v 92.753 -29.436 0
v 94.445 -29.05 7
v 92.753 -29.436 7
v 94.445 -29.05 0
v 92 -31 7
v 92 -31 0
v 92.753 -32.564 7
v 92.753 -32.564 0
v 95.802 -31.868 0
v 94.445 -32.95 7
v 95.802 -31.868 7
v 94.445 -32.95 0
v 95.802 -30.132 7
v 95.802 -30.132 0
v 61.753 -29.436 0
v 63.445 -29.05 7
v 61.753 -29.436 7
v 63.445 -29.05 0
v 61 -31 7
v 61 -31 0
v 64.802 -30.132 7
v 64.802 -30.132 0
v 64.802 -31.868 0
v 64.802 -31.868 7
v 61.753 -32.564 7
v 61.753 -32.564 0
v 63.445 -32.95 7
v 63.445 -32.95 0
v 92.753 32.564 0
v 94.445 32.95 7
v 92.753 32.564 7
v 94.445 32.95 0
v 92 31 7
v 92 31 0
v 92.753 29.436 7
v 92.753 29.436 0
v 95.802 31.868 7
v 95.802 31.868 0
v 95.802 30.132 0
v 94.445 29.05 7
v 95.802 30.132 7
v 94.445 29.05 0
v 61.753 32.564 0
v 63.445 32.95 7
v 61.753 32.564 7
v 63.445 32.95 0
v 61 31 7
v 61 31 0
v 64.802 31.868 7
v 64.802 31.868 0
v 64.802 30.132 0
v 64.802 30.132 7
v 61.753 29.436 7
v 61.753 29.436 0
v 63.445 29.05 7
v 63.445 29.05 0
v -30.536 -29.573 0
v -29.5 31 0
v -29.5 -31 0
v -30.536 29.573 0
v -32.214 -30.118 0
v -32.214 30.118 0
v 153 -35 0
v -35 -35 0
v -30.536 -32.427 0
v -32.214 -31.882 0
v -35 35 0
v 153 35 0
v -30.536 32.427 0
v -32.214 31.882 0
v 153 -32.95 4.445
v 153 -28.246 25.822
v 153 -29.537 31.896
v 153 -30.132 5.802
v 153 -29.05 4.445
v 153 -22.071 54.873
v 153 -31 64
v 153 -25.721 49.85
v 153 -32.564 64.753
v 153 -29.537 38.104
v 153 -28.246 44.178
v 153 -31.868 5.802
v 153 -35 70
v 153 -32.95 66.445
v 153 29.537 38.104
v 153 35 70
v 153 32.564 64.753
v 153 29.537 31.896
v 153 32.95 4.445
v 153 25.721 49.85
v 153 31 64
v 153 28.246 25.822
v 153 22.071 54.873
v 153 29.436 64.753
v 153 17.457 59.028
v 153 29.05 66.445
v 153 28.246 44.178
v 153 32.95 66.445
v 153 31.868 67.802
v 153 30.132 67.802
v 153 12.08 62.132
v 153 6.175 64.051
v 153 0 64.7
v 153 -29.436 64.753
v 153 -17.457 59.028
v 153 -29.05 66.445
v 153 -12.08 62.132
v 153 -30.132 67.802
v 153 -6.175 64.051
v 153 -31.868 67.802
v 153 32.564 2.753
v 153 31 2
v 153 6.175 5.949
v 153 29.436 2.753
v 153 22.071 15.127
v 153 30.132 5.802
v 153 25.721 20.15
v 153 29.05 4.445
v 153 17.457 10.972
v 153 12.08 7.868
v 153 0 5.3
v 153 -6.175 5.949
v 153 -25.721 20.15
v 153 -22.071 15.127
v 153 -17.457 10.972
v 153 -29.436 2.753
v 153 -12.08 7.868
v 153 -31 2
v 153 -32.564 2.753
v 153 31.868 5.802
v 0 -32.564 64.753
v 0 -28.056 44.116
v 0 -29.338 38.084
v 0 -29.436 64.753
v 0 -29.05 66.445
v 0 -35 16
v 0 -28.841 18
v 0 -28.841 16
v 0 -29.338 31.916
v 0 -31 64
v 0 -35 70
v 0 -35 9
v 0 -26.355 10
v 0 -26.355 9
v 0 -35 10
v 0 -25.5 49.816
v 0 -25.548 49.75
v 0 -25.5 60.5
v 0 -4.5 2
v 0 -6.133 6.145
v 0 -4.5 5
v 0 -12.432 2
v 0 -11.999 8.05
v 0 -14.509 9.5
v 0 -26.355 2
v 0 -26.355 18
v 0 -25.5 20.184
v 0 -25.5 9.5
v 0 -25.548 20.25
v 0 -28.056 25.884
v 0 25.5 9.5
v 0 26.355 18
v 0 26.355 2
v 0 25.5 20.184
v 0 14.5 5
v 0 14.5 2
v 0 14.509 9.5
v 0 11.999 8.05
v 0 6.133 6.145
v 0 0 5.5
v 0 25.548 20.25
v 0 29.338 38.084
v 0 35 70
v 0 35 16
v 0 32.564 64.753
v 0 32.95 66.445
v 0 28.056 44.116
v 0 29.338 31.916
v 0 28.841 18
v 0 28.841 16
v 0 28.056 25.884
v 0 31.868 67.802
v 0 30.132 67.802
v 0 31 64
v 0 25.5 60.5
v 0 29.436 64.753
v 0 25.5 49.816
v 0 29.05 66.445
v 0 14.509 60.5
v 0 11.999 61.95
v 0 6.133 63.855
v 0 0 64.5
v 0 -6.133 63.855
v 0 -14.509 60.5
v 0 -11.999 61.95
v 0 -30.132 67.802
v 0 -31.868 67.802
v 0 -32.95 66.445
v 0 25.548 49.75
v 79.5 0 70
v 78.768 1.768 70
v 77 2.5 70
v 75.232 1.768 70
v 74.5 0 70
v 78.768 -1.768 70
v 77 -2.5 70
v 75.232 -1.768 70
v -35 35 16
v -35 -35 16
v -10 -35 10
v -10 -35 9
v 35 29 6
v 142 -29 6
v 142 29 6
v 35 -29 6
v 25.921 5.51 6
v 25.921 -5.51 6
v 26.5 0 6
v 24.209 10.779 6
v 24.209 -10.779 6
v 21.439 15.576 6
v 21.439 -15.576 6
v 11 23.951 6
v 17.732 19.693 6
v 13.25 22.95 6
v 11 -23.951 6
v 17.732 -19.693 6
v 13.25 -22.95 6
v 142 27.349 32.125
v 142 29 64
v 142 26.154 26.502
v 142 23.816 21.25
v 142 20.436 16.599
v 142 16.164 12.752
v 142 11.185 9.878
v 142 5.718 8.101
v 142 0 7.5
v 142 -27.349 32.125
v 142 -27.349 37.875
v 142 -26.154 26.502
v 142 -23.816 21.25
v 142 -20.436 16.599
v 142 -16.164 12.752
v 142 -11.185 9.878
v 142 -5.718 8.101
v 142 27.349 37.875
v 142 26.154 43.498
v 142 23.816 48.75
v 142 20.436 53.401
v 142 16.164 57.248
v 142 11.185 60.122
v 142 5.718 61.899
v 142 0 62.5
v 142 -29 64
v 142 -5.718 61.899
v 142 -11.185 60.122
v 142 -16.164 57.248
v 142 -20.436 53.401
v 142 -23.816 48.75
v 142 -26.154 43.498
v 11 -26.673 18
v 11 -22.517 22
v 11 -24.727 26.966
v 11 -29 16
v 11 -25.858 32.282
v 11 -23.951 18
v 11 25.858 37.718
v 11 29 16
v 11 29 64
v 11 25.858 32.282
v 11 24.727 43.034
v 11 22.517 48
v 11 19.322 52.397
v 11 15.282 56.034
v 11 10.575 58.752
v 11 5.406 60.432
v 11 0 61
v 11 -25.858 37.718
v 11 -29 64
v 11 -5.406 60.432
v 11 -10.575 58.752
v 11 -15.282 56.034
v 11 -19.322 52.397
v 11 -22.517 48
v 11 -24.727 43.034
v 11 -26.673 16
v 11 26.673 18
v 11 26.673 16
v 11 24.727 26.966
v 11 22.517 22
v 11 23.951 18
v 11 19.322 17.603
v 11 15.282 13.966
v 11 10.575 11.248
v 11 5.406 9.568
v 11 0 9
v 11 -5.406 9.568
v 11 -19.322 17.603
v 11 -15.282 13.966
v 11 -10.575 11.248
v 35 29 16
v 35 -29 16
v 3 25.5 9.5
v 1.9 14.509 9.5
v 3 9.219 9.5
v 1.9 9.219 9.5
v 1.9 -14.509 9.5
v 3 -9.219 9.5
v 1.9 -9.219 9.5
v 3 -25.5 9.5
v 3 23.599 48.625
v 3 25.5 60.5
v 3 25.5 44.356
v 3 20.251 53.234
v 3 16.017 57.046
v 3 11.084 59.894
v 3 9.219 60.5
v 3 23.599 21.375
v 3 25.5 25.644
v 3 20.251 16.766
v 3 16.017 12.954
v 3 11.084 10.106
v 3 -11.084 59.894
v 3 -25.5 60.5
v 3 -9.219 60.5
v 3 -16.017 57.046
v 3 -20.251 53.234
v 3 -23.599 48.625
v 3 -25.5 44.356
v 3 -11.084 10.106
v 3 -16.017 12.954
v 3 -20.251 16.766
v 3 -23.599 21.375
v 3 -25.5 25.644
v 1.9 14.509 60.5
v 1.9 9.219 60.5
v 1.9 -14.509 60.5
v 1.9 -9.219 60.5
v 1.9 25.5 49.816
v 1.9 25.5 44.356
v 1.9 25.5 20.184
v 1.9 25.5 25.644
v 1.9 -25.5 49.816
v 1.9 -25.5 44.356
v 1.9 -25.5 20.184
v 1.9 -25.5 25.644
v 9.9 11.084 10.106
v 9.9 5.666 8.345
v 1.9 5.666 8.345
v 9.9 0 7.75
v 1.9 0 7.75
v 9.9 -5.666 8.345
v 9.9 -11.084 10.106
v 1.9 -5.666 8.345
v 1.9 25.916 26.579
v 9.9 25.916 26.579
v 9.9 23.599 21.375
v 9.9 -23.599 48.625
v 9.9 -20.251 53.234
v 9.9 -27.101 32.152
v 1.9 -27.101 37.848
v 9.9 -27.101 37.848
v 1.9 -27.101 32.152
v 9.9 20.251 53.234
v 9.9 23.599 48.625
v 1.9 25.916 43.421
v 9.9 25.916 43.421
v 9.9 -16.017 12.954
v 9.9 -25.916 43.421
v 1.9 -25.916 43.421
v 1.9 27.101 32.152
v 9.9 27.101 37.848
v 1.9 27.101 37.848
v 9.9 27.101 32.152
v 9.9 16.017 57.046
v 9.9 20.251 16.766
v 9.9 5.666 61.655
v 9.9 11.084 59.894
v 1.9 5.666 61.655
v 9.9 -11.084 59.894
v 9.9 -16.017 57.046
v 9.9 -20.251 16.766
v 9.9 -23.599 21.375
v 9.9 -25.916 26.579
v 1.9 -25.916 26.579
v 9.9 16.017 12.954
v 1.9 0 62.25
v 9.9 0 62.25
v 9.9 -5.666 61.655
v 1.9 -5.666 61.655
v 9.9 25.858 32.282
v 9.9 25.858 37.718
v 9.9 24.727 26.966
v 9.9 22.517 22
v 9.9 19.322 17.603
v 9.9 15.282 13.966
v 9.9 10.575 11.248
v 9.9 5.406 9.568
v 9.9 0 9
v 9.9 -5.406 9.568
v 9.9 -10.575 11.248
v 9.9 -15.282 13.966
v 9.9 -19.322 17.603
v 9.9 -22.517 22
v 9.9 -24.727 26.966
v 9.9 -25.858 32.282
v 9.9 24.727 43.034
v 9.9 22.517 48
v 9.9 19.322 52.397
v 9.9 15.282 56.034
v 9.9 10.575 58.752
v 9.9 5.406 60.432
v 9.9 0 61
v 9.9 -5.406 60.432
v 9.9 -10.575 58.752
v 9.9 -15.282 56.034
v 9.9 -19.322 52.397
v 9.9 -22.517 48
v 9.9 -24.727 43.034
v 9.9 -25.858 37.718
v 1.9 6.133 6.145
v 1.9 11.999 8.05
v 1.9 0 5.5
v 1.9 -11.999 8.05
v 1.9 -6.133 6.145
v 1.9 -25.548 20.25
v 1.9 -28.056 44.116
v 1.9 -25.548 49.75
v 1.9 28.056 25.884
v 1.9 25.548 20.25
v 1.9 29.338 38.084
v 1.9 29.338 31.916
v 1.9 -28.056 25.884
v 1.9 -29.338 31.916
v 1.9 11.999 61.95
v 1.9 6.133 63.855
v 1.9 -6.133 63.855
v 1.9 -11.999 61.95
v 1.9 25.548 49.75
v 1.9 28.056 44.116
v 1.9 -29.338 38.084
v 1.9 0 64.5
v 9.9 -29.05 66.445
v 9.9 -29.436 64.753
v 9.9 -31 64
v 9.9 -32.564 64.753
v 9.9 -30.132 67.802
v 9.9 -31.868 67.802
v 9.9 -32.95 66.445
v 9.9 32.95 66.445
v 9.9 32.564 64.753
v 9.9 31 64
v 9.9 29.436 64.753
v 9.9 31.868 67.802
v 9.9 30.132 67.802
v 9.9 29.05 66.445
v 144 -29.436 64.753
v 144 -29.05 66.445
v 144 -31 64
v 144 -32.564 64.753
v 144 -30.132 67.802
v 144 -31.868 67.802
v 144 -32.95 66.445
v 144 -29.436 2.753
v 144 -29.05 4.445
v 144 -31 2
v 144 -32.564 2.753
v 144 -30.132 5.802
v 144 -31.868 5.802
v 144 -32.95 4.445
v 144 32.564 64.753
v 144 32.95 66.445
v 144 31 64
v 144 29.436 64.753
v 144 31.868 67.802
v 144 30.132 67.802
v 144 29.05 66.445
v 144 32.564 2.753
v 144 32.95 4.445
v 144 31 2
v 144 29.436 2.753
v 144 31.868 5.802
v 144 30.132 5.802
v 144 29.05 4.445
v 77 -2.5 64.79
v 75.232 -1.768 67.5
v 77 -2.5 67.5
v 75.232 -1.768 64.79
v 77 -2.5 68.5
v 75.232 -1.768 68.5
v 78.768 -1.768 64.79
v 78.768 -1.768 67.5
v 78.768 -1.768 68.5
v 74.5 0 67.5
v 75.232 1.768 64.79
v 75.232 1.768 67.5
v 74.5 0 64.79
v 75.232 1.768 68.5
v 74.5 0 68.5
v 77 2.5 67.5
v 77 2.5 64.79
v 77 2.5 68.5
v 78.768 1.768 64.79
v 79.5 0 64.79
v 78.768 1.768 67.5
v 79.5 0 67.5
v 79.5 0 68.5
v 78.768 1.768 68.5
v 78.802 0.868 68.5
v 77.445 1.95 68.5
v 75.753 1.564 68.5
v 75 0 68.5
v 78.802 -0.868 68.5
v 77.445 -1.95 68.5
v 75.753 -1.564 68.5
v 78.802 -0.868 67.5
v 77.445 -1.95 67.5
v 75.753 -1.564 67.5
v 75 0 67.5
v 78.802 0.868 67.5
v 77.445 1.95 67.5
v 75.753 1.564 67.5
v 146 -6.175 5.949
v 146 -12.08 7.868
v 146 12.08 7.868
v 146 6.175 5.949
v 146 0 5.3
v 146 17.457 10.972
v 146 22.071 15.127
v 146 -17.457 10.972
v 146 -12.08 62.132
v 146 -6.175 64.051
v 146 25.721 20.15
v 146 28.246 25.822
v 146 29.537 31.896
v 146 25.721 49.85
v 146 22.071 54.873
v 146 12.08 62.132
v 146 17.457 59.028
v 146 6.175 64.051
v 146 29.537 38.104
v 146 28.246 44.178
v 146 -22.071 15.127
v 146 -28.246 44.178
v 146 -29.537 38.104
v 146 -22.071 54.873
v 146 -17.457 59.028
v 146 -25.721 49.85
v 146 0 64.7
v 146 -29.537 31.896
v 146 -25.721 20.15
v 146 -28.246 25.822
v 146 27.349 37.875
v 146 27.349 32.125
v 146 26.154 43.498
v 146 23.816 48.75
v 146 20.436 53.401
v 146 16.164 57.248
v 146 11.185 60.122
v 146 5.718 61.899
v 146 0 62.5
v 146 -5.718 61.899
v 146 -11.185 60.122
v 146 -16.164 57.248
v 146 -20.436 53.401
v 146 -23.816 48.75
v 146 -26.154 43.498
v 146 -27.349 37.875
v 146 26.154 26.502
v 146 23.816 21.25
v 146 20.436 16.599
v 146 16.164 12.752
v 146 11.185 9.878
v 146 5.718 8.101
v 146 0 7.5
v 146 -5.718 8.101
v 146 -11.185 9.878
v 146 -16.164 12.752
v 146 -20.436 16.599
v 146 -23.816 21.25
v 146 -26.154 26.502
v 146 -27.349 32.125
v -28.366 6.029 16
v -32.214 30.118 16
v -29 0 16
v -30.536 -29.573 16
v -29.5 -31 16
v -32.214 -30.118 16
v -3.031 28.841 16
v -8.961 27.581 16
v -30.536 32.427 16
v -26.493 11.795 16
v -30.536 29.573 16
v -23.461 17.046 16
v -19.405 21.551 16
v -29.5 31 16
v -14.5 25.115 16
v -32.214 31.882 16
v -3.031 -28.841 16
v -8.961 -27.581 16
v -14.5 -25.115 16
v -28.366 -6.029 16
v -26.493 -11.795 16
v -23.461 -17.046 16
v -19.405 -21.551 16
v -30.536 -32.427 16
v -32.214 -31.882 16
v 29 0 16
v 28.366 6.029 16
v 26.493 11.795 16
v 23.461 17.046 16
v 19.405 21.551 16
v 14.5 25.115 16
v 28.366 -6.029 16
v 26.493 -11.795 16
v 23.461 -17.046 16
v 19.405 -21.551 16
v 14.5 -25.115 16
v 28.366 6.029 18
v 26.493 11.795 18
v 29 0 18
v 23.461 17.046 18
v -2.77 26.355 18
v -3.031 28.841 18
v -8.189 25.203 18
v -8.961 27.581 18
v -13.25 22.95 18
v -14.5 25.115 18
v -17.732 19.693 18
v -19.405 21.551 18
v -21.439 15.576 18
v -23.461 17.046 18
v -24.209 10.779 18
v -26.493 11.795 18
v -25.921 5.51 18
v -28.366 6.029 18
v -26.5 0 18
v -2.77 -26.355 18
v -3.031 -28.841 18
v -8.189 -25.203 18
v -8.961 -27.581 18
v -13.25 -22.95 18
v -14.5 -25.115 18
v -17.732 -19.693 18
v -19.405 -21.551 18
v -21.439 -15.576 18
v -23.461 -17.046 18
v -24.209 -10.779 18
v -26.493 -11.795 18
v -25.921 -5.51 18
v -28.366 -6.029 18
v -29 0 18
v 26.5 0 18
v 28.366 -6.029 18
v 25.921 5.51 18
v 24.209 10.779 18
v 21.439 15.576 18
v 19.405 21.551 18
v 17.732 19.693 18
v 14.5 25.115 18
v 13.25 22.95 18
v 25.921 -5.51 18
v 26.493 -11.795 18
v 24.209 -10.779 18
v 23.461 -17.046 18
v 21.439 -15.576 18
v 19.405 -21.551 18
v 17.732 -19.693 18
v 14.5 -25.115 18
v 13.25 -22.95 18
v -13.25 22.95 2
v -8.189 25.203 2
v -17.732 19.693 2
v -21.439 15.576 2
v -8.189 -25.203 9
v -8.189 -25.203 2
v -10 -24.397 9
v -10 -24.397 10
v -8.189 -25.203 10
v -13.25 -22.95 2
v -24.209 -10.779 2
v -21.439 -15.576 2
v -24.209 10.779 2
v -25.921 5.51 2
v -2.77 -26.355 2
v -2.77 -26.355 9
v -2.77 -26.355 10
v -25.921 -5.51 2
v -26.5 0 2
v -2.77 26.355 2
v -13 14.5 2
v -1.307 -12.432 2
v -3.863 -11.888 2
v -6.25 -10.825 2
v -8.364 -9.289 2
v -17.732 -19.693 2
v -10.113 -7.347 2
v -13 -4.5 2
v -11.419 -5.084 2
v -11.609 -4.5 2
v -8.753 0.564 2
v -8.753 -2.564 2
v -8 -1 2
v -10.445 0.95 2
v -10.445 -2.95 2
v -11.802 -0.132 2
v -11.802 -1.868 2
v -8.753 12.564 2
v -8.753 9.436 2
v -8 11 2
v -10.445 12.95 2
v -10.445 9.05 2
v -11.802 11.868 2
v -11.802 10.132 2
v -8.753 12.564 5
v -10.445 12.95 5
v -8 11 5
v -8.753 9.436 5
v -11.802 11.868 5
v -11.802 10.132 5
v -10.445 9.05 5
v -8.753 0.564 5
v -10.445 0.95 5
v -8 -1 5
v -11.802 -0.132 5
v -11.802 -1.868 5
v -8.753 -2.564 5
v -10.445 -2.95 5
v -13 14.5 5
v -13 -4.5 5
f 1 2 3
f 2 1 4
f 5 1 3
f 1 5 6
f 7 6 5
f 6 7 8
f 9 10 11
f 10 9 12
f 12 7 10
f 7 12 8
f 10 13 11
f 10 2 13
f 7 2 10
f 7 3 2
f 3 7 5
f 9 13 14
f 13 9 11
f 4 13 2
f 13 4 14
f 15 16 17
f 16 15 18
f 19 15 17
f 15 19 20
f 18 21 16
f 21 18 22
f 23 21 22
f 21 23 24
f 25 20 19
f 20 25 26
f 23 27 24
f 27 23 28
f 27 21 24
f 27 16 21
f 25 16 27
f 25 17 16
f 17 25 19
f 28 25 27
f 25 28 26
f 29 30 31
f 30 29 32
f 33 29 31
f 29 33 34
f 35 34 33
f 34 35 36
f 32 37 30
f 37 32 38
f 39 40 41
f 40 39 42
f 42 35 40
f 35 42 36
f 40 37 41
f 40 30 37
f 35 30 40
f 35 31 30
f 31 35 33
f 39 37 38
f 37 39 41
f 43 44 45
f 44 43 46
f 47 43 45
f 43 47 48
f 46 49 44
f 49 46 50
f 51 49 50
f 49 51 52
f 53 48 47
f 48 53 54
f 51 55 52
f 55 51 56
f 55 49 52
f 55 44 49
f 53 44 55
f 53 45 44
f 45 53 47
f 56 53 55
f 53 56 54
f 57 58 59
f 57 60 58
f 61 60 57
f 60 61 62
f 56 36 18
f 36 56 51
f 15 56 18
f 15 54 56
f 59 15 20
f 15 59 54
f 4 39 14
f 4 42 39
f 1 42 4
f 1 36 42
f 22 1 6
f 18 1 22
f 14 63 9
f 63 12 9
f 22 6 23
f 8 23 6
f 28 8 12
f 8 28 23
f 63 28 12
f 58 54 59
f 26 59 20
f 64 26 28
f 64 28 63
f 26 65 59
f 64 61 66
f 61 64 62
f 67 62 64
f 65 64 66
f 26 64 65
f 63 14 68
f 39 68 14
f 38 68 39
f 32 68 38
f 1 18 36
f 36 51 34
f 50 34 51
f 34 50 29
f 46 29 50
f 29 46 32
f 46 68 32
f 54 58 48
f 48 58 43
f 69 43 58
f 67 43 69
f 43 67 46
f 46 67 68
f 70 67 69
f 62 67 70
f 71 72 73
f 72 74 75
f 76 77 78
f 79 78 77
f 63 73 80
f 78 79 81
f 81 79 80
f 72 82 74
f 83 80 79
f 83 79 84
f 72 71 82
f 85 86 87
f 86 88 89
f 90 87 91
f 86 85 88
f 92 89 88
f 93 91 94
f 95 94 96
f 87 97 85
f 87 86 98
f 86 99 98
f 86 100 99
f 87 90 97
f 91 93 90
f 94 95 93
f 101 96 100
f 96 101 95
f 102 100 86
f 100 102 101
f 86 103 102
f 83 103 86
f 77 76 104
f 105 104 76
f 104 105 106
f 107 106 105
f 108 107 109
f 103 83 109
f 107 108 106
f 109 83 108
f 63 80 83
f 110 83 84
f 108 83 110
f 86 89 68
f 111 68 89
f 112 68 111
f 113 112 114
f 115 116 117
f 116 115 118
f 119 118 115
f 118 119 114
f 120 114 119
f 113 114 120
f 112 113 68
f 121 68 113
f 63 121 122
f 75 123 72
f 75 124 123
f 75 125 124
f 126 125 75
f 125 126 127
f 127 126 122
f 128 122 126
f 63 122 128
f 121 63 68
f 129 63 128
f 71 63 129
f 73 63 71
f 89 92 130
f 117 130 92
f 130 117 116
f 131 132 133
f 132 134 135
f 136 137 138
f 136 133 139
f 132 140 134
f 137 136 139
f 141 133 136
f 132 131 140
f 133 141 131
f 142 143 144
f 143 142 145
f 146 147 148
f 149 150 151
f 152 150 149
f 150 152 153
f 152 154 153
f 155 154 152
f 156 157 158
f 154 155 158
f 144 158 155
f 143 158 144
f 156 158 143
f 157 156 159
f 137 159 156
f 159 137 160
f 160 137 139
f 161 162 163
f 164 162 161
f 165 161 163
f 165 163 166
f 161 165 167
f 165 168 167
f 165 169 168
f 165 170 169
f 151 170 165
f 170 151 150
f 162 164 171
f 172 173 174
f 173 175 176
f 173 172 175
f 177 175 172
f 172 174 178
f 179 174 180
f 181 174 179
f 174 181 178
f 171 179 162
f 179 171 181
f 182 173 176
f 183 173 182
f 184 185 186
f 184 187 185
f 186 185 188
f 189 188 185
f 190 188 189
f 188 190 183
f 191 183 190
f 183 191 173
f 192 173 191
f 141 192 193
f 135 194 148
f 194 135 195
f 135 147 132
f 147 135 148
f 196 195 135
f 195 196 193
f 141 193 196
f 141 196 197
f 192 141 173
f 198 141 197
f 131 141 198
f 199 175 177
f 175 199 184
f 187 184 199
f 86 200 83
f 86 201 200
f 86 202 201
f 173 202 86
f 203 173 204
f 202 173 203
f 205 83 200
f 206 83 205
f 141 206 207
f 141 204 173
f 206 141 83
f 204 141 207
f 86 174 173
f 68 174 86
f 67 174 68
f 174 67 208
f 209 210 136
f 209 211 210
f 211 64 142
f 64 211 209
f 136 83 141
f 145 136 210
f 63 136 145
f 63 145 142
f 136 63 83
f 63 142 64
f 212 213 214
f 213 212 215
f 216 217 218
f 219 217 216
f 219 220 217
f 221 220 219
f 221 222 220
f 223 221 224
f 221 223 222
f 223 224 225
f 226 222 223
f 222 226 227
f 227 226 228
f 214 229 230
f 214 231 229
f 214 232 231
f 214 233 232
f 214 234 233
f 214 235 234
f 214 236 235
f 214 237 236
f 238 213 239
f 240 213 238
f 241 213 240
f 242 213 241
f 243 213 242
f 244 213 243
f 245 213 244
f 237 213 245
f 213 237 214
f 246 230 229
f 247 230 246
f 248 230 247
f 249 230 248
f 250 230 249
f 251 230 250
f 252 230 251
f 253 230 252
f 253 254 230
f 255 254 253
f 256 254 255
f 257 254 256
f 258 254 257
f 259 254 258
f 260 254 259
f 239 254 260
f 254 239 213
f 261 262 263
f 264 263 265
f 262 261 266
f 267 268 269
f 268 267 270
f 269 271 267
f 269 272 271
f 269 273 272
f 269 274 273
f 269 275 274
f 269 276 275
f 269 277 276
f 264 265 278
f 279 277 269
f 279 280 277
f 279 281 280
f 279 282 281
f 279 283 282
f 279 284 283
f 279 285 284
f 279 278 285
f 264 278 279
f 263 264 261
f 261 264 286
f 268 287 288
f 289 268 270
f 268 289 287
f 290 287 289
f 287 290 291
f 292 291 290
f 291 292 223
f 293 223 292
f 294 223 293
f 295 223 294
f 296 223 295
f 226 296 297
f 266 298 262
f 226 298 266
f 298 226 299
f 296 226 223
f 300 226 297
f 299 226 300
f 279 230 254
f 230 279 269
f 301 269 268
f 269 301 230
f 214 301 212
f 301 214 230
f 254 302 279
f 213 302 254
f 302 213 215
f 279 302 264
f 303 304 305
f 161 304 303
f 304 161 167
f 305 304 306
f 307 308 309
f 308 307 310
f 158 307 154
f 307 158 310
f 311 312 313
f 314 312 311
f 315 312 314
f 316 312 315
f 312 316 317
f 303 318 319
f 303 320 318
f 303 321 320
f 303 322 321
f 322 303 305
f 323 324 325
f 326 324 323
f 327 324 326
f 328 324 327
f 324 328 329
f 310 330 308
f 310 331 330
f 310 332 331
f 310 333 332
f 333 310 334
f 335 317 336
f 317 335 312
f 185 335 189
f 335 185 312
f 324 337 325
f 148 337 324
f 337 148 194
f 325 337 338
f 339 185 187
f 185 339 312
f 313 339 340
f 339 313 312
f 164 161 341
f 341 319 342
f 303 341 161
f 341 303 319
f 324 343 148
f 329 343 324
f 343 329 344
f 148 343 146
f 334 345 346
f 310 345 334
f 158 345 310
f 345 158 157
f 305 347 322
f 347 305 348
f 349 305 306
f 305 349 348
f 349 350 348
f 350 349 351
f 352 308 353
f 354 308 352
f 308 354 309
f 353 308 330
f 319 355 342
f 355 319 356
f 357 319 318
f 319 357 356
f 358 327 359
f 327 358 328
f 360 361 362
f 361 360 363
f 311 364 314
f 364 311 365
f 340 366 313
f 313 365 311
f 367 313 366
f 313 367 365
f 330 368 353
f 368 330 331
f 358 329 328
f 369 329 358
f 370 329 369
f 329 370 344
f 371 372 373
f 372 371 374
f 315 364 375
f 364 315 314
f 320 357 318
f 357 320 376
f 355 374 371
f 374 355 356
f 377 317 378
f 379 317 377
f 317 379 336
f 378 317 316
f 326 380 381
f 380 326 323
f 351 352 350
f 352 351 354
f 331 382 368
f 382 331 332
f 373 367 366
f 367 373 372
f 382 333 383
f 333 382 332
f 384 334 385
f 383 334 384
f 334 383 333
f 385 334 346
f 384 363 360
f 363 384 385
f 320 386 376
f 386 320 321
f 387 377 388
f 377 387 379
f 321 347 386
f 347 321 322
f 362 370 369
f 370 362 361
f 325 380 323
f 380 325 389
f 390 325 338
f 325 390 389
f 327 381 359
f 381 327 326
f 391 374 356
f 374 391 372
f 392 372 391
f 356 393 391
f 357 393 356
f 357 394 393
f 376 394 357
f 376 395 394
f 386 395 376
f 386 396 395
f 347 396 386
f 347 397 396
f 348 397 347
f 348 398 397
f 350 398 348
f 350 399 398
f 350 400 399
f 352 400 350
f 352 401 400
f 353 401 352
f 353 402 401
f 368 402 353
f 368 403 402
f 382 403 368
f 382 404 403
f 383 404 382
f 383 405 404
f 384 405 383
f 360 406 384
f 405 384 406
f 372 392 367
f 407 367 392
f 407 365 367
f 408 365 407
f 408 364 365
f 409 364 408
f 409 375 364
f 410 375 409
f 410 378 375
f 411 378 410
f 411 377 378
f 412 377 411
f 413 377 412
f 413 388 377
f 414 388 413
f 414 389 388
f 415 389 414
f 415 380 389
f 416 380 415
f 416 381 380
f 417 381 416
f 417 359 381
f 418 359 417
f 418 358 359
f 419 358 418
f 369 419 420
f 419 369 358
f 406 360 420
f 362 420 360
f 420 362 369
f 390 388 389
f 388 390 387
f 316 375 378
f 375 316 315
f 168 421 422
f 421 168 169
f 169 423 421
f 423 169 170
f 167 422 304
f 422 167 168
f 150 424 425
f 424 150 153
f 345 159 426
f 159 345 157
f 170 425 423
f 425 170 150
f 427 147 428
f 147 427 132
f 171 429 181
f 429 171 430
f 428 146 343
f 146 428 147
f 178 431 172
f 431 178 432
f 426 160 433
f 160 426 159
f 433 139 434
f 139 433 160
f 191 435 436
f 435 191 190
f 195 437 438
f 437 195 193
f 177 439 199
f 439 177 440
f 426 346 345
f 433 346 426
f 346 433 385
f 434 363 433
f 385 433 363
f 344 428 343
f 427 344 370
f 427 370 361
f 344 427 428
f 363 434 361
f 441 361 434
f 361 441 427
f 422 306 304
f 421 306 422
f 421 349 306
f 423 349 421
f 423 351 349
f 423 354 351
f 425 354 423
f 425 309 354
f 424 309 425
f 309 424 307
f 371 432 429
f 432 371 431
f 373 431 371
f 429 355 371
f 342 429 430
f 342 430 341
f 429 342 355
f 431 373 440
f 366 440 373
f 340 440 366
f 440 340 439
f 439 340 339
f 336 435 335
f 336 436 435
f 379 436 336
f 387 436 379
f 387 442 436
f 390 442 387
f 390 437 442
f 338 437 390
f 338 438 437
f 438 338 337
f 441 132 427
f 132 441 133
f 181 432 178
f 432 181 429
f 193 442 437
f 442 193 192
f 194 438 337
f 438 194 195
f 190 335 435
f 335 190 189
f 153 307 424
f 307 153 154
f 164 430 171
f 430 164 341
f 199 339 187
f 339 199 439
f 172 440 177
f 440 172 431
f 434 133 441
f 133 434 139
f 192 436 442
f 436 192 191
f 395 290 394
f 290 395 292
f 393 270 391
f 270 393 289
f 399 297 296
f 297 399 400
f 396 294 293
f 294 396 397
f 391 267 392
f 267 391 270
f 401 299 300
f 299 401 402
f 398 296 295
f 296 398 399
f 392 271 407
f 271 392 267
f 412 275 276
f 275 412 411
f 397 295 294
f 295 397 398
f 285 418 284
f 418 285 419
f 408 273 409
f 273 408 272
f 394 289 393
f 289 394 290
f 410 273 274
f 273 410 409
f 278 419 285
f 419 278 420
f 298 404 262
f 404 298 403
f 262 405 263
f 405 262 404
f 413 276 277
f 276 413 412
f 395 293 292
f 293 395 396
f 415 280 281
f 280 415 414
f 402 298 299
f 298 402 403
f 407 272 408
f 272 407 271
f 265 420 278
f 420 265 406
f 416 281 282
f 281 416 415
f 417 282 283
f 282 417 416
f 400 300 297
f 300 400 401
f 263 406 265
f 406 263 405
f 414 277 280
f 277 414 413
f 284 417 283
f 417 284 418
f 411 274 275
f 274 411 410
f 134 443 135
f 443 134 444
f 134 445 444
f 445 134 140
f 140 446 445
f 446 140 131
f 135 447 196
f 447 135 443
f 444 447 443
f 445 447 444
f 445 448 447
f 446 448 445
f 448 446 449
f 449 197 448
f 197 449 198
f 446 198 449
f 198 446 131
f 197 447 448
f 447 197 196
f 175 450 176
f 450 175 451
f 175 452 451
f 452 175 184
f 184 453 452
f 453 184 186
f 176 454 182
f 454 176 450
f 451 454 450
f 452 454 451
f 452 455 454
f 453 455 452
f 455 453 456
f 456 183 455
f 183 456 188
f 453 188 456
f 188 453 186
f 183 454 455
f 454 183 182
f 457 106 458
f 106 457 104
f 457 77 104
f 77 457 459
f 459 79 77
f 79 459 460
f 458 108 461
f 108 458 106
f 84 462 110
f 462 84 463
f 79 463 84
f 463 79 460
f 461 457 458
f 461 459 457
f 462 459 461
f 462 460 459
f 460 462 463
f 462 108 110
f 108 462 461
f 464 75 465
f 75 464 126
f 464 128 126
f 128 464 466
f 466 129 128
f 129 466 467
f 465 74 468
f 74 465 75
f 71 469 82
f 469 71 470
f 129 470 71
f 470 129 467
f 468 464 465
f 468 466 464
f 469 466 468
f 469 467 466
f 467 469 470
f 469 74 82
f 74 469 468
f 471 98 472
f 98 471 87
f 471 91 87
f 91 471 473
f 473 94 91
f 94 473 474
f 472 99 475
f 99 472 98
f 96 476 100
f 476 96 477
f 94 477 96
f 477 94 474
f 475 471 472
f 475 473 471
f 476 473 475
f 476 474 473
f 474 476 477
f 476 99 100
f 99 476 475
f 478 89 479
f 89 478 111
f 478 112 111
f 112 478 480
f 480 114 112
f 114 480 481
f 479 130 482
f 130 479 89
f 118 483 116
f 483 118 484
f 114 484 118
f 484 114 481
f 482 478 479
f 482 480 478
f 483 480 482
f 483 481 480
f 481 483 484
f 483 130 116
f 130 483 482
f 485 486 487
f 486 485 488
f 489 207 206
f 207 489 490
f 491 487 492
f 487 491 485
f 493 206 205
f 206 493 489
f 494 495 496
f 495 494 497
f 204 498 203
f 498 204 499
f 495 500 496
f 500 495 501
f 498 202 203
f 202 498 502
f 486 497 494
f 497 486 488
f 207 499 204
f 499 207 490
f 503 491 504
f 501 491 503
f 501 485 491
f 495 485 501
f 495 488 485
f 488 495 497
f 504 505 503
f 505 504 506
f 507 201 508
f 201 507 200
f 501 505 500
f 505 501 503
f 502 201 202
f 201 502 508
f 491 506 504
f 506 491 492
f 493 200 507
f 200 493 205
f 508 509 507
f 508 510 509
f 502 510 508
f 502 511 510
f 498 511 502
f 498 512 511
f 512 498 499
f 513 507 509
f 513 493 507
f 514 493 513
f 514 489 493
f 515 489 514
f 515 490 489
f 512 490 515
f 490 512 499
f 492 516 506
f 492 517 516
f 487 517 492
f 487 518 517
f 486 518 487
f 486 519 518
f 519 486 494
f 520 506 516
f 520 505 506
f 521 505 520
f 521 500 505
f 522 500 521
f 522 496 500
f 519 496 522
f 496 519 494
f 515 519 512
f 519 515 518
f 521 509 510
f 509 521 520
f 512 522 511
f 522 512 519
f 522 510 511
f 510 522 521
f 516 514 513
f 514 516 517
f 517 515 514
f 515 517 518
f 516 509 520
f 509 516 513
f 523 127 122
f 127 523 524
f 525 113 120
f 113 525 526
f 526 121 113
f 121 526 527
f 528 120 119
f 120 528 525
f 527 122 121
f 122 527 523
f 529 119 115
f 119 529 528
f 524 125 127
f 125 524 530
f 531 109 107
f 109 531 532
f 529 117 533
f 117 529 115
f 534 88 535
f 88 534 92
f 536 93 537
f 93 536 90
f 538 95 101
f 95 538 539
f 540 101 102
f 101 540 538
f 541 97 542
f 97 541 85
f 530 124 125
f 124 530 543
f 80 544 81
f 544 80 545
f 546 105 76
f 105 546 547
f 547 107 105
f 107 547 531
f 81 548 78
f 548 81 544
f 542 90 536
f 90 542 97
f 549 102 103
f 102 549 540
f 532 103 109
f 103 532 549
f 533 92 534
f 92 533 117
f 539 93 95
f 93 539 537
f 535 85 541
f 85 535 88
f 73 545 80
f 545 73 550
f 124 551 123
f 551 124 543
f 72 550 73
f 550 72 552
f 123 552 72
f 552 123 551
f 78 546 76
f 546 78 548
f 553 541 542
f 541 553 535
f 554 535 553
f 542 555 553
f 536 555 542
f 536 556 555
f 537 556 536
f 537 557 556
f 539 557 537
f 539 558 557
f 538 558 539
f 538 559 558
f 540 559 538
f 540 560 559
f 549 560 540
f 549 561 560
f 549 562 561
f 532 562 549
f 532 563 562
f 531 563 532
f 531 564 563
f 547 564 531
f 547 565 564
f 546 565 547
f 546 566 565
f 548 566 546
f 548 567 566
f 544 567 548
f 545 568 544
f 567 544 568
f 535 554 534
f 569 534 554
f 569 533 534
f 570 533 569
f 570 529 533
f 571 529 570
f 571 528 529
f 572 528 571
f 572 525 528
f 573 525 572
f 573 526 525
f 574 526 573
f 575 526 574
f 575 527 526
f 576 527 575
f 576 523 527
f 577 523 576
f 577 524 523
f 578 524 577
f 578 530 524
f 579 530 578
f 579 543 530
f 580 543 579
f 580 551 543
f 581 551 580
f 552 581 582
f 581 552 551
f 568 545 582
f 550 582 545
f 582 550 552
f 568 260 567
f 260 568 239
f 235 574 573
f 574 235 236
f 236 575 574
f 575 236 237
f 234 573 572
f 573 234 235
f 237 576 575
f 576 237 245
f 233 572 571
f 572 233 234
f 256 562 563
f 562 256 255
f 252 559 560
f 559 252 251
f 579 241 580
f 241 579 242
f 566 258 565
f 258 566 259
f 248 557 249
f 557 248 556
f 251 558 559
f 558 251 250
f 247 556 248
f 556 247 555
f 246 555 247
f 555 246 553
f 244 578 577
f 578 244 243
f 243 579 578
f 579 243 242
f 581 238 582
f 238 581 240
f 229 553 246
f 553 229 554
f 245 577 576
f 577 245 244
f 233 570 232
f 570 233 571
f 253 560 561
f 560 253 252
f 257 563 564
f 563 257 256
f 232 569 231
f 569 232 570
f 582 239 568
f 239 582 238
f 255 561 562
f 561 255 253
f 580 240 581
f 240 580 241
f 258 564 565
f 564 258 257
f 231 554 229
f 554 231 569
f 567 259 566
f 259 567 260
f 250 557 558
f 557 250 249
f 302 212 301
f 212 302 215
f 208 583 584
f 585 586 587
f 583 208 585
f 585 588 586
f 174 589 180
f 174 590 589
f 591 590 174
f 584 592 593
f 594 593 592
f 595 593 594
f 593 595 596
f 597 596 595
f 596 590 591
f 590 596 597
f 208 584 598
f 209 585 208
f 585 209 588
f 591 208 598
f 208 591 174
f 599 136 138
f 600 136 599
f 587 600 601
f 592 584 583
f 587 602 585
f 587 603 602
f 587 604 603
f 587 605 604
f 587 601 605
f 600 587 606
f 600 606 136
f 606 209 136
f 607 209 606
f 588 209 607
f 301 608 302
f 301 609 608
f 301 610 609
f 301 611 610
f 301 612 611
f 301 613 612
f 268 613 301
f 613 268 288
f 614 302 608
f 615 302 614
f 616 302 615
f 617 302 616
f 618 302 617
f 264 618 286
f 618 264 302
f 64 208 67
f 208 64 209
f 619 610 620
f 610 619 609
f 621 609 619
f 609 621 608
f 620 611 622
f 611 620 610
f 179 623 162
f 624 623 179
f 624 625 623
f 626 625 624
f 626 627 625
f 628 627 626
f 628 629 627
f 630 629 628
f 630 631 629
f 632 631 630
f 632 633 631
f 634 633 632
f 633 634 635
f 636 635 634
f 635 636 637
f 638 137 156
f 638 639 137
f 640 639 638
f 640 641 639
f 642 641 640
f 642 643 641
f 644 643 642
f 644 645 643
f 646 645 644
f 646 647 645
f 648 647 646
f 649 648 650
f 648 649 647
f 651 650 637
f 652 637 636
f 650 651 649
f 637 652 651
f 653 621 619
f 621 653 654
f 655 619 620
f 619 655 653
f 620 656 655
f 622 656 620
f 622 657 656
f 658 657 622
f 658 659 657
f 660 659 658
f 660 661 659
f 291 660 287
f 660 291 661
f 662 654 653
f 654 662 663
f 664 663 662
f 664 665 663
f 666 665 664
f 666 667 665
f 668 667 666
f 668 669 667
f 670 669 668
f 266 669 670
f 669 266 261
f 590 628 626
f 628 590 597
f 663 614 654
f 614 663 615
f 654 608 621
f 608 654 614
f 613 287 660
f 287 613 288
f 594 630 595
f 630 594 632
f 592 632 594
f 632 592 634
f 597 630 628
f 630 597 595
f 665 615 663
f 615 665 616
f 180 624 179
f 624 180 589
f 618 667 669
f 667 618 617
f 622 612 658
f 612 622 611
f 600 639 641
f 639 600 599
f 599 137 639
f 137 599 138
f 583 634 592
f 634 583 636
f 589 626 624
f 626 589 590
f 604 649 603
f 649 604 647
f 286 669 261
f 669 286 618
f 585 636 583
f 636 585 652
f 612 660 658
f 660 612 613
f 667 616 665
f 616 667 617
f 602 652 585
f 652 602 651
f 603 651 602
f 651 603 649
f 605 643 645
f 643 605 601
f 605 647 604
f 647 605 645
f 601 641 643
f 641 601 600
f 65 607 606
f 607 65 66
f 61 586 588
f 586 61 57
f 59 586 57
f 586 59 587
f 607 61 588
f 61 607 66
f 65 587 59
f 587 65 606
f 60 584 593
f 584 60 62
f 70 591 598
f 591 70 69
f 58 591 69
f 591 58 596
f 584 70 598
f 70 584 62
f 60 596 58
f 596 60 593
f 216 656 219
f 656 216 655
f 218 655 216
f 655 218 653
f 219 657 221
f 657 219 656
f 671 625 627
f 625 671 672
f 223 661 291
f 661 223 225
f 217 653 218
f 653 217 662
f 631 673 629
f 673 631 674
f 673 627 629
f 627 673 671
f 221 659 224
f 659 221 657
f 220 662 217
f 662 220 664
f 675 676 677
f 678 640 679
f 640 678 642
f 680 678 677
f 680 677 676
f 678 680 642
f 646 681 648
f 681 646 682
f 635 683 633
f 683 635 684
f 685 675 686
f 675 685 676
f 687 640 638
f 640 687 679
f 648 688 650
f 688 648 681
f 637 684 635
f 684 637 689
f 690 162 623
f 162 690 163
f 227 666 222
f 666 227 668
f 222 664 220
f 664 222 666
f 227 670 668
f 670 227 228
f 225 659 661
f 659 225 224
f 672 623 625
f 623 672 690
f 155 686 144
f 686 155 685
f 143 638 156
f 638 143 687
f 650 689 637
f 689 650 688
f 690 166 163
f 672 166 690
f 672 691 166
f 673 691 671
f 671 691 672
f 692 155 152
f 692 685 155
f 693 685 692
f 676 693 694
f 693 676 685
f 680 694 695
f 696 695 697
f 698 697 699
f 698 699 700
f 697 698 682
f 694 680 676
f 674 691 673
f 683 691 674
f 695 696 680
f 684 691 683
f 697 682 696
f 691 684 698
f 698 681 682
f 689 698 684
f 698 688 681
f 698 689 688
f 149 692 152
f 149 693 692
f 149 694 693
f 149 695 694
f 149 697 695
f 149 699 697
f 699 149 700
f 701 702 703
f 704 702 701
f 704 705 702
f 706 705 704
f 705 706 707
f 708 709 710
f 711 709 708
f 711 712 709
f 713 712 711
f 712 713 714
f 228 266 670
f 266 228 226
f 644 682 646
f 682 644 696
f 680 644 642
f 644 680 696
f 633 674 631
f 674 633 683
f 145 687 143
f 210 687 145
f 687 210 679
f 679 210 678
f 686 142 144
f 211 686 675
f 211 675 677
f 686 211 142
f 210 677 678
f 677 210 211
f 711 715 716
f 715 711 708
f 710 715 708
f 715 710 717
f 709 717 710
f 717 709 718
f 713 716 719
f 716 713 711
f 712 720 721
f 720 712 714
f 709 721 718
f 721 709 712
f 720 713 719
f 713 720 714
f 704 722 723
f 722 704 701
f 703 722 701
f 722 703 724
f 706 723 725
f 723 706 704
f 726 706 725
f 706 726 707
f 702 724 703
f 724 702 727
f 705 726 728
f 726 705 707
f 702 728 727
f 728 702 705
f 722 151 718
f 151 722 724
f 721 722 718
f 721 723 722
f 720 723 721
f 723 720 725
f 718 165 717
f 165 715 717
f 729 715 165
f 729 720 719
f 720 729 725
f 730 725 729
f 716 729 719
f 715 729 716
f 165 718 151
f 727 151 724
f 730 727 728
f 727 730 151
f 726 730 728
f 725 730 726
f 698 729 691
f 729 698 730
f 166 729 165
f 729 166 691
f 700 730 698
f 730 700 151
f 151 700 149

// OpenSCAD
// file: Camara.scad
include <Tubo.scad>



//translate([0,0,30])
//bigTubo();

Camara();




module Camara(){

//Alsa para cámara
//translate([-12.5,-10,5])
//cube([25,24,2]);

difference(){

//Crear bloque
creaBloqueCam();

//Tornillos abajo
translate([-ori+4,-ori+4,-0.1])
cylinder(r=1.5,30);
translate([ori-4,-ori+4,-0.1])
cylinder(r=1.5,30);
translate([-ori+4,ori-4,-0.1])
cylinder(r=1.5,30);
translate([ori-4,ori-4,-0.1])
cylinder(r=1.5,30);

//Tubo para camara
translate([0,0,2])
cylinder(r=(raspSellR/2)-3,18);

//Ranura cable
translate([-10,-ori-5,9])
cube([20,20,1]);

}


difference(){

translate([-13,-4.5,1])
cube([26,19,4]);

tornCam();
}





}


module tornCam(){
//Tornillos camara
translate([-10,11,-0.1])
cylinder(r=2,30);
translate([10,11,-0.1])
cylinder(r=2,30);
translate([-10,-1,-0.1])
cylinder(r=2,30);
translate([10,-1,-0.1])
cylinder(r=2,30);
}


module creaBloqueCam(){
//Bloque
translate([-bigW/2,-bigW/2,0])
cube([bigW,bigW,16]);

//Sello
cylinder(r=(raspSellR/2)-0.5,18);


}
// file: Tubo.scad
bigW = 70;
ori = bigW/2;
raspSellR = 59;
tuboH = 140;
H = tuboH+2+8+1+2;
selloH = 7;

huecoPared = 12;
huecoH = 22;

translate([0,0,bigW/2])
rotate([0,90,0])
bigTuboHueco();

module bigTuboHueco()
{
	difference()
	{
		bigTubo();	
		sello();
	}
}


module sello()
{
	translate([0,0,H-selloH])
	cylinder(r=(raspSellR/2)+0.2,selloH+0.1);
	
	translate([0,0,H-selloH-30])
	cylinder(r=(raspSellR/2)-2,selloH+40);
}


module bigTubo(){

difference(){

//Bloque
translate([-bigW/2,-bigW/2,0])
cube([bigW,bigW,H]);


translate([
						-(bigW-huecoPared)/2,
						-(bigW-huecoPared)/2,
						(huecoH/2)
					])
		cube([
					bigW-huecoPared,
					bigW-huecoPared,
					H-huecoH]
				);


//Diffractador
translate([-25.5,-25.5,-0.1])
cube([51,51,3.1]);

//Macro
translate([0,0,-0.1])
cylinder(r=(54.5/2),10);

//Sello de raspberry
translate([0,0,-0.1])
cylinder(r=(raspSellR/2),2);

//Tubo
translate([0,0,-0.1])
cylinder(r=(52/2),200);

//Tornillos abajo
translate([-ori+4,-ori+4,-0.1])
cylinder(r=2,10);
translate([ori-4,-ori+4,-0.1])
cylinder(r=2,10);
translate([-ori+4,ori-4,-0.1])
cylinder(r=2,10);
translate([ori-4,ori-4,-0.1])
cylinder(r=2,10);

//Hueco
//translate([0,0,2+8+1+2])
//cylinder(r=(raspSellR/2),tuboH+0.1);

//Tornillos arriba
translate([-ori+4,-ori+4,H-9])
cylinder(r=2,10);
translate([ori-4,-ori+4,H-9])
cylinder(r=2,10);
translate([-ori+4,ori-4,H-9])
cylinder(r=2,10);
translate([ori-4,ori-4,H-9])
cylinder(r=2,10);

//Tornillos caja
translate([0,0,(tuboH/2)-7])
rotate([0,90,0])
tornillosArriba();

//Tornillo tripie
translate([-ori-0.1,0,(tuboH/2)+7])
rotate([0,90,0])
cylinder(r=5/2,5.31);


}


//Rosca tornillo tripie
difference(){
translate([-ori+1.5,0,(tuboH/2)+7])
rotate([0,90,0])
cylinder(r=5,1);

translate([-ori+1.4,0,(tuboH/2)+7])
rotate([0,90,0])
cylinder(r=5-3,3);


}

}

module tornillosArriba(){
translate([-ori+4,-ori+4,ori-7])
cylinder(r=2,10);
translate([0,-ori+4,ori-7])
cylinder(r=2,10);
translate([-ori+4,ori-4,ori-7])
cylinder(r=2,10);
translate([0,ori-4,ori-7])
cylinder(r=2,10);
}


module tornilloTripie(){
	
}
// main file
include <Tubo.scad>
include <Camara.scad>


pared = 4;
tapaW = 27;
tapaFibH = 10+8;
fibW=10;

//translate([0,0,22])
//rotate([0.0,180])
fibraOpt();




module fibraOpt(){
difference(){
cylinder(r=(tapaW/2)-1,2);
//Fibra óptica space
translate([0,0,-0.1])
cylinder(r=1.05,15);
}

}
